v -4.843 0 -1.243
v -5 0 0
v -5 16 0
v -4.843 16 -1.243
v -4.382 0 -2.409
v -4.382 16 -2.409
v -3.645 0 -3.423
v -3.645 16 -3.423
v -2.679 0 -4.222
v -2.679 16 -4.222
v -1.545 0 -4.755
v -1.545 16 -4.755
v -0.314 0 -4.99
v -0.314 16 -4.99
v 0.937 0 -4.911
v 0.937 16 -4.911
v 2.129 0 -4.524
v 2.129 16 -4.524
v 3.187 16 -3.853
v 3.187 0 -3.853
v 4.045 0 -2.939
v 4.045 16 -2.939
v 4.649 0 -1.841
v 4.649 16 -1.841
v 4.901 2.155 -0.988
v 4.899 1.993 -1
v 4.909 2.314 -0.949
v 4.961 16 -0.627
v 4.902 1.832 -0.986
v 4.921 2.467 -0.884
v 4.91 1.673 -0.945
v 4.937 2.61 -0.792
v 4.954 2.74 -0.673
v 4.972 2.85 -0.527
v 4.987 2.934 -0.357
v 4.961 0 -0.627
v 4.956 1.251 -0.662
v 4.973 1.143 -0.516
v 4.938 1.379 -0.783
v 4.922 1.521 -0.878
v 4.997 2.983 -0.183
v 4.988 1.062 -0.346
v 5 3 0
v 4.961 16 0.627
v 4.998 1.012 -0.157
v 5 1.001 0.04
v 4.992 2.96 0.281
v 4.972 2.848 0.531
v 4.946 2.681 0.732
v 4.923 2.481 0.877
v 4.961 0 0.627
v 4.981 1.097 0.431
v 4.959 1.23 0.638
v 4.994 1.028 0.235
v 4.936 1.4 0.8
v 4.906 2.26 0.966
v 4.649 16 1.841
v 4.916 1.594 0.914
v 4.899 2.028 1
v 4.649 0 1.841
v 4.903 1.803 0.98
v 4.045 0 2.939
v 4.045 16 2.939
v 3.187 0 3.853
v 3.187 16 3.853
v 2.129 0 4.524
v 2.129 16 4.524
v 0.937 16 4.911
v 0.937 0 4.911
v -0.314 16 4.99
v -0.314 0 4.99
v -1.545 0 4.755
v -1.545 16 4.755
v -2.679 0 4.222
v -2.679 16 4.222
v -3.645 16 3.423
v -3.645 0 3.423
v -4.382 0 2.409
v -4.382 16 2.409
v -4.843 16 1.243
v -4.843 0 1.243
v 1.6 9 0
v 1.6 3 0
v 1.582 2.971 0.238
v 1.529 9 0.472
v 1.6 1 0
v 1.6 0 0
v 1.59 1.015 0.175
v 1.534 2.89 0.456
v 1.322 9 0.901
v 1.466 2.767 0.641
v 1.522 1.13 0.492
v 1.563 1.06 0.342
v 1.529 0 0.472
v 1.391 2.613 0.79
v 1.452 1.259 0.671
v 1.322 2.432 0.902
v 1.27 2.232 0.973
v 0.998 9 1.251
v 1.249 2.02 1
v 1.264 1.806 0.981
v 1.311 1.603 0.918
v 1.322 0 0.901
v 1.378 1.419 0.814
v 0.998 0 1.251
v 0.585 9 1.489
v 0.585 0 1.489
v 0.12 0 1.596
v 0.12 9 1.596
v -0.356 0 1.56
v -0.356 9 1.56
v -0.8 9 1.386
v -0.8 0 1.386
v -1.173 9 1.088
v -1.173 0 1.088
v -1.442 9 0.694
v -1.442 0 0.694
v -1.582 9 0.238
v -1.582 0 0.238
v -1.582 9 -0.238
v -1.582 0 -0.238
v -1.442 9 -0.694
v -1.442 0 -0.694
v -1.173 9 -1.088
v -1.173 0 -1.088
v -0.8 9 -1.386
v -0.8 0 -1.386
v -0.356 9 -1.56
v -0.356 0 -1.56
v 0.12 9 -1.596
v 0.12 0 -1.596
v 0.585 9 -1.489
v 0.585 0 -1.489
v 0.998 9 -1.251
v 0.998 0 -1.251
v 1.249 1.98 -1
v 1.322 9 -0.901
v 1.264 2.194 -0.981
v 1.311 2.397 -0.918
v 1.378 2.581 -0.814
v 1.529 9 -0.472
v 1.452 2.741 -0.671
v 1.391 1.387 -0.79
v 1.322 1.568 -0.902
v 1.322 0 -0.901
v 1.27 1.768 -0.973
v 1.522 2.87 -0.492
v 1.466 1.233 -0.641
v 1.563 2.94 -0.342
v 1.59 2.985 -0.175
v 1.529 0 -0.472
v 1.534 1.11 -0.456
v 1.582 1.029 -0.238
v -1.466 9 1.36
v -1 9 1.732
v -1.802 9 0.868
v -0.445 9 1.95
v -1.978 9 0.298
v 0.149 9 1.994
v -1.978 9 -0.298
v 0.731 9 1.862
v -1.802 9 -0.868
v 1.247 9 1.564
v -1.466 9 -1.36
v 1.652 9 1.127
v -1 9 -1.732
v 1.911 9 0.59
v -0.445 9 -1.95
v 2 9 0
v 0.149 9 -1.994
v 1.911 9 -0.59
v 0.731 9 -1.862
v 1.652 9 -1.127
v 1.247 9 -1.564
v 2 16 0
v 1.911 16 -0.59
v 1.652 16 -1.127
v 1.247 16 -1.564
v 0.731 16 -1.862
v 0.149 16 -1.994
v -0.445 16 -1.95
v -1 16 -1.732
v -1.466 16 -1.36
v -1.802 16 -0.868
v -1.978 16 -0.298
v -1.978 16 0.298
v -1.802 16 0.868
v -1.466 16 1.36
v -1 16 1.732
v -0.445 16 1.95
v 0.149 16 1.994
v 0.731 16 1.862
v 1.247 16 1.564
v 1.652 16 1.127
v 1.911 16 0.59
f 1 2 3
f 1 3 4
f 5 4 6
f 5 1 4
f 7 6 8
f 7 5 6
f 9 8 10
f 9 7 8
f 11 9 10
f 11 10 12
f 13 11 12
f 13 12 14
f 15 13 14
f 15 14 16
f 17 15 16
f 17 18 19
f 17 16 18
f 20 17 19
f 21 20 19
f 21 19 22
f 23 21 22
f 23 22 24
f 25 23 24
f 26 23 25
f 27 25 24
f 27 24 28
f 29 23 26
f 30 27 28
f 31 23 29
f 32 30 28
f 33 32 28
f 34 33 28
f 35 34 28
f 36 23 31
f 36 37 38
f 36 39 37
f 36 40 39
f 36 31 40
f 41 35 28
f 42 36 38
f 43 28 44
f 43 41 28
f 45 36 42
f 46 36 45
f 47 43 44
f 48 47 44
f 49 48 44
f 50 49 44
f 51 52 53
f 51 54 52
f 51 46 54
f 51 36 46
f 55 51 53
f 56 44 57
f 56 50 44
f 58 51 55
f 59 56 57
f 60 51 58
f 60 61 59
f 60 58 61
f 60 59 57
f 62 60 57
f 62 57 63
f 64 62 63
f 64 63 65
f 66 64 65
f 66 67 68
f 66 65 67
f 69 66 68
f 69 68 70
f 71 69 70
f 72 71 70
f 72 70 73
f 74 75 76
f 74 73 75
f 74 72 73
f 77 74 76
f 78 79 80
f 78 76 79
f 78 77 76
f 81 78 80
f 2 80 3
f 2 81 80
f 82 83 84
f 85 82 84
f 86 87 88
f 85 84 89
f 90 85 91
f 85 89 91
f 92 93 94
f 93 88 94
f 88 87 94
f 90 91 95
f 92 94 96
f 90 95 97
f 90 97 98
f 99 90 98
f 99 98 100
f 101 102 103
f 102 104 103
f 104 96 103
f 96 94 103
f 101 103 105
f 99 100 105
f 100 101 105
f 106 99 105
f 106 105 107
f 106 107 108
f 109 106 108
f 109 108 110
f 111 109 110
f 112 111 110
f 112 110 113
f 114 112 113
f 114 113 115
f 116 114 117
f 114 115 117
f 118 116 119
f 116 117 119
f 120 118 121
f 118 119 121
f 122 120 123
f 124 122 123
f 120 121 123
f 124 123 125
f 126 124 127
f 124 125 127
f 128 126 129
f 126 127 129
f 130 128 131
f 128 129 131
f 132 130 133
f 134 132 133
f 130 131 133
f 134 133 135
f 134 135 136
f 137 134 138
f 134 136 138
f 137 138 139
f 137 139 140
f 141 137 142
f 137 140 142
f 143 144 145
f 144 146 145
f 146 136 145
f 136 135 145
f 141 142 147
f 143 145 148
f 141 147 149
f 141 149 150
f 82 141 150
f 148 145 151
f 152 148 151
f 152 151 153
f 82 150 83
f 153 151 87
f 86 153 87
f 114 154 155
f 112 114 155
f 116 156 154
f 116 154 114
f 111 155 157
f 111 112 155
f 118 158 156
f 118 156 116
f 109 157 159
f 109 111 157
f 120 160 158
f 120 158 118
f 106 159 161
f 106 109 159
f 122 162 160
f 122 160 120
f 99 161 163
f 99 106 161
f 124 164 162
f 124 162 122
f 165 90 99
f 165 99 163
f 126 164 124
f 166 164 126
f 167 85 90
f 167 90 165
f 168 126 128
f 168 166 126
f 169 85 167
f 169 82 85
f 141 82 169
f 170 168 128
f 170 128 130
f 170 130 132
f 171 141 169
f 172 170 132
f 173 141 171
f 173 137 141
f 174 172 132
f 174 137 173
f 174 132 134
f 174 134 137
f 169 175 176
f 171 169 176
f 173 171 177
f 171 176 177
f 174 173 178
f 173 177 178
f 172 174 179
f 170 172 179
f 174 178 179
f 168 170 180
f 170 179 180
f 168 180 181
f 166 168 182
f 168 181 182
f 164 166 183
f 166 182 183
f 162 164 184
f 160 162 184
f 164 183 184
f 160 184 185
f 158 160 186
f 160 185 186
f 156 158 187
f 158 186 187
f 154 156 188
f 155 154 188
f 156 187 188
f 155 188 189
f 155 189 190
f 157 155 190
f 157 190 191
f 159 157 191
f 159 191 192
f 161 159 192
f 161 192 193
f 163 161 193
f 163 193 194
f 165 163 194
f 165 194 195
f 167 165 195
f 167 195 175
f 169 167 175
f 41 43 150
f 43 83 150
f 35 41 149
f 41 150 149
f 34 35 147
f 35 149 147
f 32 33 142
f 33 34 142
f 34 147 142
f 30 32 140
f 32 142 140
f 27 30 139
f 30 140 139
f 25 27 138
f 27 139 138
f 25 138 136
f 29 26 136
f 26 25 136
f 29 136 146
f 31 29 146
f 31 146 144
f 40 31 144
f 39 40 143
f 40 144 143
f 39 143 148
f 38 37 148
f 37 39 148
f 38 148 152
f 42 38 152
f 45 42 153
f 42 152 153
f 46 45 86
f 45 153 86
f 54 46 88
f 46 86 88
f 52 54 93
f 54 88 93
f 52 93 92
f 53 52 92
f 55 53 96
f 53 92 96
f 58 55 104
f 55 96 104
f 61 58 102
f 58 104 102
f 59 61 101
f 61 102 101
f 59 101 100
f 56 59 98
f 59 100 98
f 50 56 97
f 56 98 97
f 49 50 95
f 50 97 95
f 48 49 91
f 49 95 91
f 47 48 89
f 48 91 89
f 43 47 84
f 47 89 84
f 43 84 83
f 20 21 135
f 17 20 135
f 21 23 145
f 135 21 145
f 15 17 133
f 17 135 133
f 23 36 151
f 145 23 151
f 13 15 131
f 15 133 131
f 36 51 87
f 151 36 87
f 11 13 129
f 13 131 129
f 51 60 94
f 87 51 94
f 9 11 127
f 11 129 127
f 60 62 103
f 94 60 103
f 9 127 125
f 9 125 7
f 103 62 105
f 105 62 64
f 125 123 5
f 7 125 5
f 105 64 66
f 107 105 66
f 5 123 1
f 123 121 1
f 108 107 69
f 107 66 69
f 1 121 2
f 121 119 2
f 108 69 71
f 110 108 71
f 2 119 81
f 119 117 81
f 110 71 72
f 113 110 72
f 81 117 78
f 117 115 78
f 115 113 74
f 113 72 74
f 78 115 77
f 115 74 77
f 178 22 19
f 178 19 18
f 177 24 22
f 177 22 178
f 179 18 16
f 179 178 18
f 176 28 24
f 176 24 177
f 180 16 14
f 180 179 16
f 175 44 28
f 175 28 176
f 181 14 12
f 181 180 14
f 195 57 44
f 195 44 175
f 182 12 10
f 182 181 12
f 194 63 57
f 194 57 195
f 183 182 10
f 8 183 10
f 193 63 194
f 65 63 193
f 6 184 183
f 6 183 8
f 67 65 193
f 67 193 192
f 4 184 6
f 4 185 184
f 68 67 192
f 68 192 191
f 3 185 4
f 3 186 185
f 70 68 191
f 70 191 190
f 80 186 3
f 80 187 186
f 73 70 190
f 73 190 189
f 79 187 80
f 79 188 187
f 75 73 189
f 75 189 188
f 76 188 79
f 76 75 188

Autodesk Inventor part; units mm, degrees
ref_plane "YZ Plane" through (0, 0, 0) normal (1, 0, 0) x (0, 1, 0)
ref_plane "XZ Plane" through (0, 0, 0) normal (0, 1, 0) x (-1, 0, 0)
ref_plane "XY Plane" through (0, 0, 0) normal (0, 0, 1) x (1, 0, 0)
sketch "Esquisse1" plane through (0, 0, 0) normal (0, 1, 0) x (-1, 0, 0)
  circle A0 centre (0, 0) radius 5
  dimension "d0" = 10
extrude "Extrusion1" add sketch "Esquisse1" along normal blind 16
sketch "Esquisse2" plane through (0, 16, 0) normal (0, 1, 0) x (1, 0, 0)
  circle A0 centre (0, 0) radius 5 projected
  circle A1 centre (0, 0) radius 2
  dimension "d3" = 4
extrude "Extrusion2" cut sketch "Esquisse2" against normal blind 7 contours A1
thread "Filetage1" size "M4x0.7" class "6H" standard "ANSI Metric M Profile" full length
sketch "Esquisse3" plane through (0, 0, 0) normal (0, -1, 0) x (1, 0, 0)
  circle A0 centre (0, 0) radius 5 projected
  circle A1 centre (0, 0) radius 1.6
  dimension "d8" = 3.2
extrude "Extrusion3" cut sketch "Esquisse3" against normal through all contours A1
sketch "Esquisse4" plane through (0, 0, 0) normal (1, 0, 0) x (0, 1, 0)
  circle A0 centre (2, 0) radius 1
  point P0 (0, 0)
  dimension "d11" = 2
extrude "Extrusion4" cut sketch "Esquisse4" along normal through all
thread "Filetage2" size "M2x0.4" class "6H" standard "ANSI Metric M Profile" full length
properties part number "Fixation-potar" material "Aluminium 6061"
